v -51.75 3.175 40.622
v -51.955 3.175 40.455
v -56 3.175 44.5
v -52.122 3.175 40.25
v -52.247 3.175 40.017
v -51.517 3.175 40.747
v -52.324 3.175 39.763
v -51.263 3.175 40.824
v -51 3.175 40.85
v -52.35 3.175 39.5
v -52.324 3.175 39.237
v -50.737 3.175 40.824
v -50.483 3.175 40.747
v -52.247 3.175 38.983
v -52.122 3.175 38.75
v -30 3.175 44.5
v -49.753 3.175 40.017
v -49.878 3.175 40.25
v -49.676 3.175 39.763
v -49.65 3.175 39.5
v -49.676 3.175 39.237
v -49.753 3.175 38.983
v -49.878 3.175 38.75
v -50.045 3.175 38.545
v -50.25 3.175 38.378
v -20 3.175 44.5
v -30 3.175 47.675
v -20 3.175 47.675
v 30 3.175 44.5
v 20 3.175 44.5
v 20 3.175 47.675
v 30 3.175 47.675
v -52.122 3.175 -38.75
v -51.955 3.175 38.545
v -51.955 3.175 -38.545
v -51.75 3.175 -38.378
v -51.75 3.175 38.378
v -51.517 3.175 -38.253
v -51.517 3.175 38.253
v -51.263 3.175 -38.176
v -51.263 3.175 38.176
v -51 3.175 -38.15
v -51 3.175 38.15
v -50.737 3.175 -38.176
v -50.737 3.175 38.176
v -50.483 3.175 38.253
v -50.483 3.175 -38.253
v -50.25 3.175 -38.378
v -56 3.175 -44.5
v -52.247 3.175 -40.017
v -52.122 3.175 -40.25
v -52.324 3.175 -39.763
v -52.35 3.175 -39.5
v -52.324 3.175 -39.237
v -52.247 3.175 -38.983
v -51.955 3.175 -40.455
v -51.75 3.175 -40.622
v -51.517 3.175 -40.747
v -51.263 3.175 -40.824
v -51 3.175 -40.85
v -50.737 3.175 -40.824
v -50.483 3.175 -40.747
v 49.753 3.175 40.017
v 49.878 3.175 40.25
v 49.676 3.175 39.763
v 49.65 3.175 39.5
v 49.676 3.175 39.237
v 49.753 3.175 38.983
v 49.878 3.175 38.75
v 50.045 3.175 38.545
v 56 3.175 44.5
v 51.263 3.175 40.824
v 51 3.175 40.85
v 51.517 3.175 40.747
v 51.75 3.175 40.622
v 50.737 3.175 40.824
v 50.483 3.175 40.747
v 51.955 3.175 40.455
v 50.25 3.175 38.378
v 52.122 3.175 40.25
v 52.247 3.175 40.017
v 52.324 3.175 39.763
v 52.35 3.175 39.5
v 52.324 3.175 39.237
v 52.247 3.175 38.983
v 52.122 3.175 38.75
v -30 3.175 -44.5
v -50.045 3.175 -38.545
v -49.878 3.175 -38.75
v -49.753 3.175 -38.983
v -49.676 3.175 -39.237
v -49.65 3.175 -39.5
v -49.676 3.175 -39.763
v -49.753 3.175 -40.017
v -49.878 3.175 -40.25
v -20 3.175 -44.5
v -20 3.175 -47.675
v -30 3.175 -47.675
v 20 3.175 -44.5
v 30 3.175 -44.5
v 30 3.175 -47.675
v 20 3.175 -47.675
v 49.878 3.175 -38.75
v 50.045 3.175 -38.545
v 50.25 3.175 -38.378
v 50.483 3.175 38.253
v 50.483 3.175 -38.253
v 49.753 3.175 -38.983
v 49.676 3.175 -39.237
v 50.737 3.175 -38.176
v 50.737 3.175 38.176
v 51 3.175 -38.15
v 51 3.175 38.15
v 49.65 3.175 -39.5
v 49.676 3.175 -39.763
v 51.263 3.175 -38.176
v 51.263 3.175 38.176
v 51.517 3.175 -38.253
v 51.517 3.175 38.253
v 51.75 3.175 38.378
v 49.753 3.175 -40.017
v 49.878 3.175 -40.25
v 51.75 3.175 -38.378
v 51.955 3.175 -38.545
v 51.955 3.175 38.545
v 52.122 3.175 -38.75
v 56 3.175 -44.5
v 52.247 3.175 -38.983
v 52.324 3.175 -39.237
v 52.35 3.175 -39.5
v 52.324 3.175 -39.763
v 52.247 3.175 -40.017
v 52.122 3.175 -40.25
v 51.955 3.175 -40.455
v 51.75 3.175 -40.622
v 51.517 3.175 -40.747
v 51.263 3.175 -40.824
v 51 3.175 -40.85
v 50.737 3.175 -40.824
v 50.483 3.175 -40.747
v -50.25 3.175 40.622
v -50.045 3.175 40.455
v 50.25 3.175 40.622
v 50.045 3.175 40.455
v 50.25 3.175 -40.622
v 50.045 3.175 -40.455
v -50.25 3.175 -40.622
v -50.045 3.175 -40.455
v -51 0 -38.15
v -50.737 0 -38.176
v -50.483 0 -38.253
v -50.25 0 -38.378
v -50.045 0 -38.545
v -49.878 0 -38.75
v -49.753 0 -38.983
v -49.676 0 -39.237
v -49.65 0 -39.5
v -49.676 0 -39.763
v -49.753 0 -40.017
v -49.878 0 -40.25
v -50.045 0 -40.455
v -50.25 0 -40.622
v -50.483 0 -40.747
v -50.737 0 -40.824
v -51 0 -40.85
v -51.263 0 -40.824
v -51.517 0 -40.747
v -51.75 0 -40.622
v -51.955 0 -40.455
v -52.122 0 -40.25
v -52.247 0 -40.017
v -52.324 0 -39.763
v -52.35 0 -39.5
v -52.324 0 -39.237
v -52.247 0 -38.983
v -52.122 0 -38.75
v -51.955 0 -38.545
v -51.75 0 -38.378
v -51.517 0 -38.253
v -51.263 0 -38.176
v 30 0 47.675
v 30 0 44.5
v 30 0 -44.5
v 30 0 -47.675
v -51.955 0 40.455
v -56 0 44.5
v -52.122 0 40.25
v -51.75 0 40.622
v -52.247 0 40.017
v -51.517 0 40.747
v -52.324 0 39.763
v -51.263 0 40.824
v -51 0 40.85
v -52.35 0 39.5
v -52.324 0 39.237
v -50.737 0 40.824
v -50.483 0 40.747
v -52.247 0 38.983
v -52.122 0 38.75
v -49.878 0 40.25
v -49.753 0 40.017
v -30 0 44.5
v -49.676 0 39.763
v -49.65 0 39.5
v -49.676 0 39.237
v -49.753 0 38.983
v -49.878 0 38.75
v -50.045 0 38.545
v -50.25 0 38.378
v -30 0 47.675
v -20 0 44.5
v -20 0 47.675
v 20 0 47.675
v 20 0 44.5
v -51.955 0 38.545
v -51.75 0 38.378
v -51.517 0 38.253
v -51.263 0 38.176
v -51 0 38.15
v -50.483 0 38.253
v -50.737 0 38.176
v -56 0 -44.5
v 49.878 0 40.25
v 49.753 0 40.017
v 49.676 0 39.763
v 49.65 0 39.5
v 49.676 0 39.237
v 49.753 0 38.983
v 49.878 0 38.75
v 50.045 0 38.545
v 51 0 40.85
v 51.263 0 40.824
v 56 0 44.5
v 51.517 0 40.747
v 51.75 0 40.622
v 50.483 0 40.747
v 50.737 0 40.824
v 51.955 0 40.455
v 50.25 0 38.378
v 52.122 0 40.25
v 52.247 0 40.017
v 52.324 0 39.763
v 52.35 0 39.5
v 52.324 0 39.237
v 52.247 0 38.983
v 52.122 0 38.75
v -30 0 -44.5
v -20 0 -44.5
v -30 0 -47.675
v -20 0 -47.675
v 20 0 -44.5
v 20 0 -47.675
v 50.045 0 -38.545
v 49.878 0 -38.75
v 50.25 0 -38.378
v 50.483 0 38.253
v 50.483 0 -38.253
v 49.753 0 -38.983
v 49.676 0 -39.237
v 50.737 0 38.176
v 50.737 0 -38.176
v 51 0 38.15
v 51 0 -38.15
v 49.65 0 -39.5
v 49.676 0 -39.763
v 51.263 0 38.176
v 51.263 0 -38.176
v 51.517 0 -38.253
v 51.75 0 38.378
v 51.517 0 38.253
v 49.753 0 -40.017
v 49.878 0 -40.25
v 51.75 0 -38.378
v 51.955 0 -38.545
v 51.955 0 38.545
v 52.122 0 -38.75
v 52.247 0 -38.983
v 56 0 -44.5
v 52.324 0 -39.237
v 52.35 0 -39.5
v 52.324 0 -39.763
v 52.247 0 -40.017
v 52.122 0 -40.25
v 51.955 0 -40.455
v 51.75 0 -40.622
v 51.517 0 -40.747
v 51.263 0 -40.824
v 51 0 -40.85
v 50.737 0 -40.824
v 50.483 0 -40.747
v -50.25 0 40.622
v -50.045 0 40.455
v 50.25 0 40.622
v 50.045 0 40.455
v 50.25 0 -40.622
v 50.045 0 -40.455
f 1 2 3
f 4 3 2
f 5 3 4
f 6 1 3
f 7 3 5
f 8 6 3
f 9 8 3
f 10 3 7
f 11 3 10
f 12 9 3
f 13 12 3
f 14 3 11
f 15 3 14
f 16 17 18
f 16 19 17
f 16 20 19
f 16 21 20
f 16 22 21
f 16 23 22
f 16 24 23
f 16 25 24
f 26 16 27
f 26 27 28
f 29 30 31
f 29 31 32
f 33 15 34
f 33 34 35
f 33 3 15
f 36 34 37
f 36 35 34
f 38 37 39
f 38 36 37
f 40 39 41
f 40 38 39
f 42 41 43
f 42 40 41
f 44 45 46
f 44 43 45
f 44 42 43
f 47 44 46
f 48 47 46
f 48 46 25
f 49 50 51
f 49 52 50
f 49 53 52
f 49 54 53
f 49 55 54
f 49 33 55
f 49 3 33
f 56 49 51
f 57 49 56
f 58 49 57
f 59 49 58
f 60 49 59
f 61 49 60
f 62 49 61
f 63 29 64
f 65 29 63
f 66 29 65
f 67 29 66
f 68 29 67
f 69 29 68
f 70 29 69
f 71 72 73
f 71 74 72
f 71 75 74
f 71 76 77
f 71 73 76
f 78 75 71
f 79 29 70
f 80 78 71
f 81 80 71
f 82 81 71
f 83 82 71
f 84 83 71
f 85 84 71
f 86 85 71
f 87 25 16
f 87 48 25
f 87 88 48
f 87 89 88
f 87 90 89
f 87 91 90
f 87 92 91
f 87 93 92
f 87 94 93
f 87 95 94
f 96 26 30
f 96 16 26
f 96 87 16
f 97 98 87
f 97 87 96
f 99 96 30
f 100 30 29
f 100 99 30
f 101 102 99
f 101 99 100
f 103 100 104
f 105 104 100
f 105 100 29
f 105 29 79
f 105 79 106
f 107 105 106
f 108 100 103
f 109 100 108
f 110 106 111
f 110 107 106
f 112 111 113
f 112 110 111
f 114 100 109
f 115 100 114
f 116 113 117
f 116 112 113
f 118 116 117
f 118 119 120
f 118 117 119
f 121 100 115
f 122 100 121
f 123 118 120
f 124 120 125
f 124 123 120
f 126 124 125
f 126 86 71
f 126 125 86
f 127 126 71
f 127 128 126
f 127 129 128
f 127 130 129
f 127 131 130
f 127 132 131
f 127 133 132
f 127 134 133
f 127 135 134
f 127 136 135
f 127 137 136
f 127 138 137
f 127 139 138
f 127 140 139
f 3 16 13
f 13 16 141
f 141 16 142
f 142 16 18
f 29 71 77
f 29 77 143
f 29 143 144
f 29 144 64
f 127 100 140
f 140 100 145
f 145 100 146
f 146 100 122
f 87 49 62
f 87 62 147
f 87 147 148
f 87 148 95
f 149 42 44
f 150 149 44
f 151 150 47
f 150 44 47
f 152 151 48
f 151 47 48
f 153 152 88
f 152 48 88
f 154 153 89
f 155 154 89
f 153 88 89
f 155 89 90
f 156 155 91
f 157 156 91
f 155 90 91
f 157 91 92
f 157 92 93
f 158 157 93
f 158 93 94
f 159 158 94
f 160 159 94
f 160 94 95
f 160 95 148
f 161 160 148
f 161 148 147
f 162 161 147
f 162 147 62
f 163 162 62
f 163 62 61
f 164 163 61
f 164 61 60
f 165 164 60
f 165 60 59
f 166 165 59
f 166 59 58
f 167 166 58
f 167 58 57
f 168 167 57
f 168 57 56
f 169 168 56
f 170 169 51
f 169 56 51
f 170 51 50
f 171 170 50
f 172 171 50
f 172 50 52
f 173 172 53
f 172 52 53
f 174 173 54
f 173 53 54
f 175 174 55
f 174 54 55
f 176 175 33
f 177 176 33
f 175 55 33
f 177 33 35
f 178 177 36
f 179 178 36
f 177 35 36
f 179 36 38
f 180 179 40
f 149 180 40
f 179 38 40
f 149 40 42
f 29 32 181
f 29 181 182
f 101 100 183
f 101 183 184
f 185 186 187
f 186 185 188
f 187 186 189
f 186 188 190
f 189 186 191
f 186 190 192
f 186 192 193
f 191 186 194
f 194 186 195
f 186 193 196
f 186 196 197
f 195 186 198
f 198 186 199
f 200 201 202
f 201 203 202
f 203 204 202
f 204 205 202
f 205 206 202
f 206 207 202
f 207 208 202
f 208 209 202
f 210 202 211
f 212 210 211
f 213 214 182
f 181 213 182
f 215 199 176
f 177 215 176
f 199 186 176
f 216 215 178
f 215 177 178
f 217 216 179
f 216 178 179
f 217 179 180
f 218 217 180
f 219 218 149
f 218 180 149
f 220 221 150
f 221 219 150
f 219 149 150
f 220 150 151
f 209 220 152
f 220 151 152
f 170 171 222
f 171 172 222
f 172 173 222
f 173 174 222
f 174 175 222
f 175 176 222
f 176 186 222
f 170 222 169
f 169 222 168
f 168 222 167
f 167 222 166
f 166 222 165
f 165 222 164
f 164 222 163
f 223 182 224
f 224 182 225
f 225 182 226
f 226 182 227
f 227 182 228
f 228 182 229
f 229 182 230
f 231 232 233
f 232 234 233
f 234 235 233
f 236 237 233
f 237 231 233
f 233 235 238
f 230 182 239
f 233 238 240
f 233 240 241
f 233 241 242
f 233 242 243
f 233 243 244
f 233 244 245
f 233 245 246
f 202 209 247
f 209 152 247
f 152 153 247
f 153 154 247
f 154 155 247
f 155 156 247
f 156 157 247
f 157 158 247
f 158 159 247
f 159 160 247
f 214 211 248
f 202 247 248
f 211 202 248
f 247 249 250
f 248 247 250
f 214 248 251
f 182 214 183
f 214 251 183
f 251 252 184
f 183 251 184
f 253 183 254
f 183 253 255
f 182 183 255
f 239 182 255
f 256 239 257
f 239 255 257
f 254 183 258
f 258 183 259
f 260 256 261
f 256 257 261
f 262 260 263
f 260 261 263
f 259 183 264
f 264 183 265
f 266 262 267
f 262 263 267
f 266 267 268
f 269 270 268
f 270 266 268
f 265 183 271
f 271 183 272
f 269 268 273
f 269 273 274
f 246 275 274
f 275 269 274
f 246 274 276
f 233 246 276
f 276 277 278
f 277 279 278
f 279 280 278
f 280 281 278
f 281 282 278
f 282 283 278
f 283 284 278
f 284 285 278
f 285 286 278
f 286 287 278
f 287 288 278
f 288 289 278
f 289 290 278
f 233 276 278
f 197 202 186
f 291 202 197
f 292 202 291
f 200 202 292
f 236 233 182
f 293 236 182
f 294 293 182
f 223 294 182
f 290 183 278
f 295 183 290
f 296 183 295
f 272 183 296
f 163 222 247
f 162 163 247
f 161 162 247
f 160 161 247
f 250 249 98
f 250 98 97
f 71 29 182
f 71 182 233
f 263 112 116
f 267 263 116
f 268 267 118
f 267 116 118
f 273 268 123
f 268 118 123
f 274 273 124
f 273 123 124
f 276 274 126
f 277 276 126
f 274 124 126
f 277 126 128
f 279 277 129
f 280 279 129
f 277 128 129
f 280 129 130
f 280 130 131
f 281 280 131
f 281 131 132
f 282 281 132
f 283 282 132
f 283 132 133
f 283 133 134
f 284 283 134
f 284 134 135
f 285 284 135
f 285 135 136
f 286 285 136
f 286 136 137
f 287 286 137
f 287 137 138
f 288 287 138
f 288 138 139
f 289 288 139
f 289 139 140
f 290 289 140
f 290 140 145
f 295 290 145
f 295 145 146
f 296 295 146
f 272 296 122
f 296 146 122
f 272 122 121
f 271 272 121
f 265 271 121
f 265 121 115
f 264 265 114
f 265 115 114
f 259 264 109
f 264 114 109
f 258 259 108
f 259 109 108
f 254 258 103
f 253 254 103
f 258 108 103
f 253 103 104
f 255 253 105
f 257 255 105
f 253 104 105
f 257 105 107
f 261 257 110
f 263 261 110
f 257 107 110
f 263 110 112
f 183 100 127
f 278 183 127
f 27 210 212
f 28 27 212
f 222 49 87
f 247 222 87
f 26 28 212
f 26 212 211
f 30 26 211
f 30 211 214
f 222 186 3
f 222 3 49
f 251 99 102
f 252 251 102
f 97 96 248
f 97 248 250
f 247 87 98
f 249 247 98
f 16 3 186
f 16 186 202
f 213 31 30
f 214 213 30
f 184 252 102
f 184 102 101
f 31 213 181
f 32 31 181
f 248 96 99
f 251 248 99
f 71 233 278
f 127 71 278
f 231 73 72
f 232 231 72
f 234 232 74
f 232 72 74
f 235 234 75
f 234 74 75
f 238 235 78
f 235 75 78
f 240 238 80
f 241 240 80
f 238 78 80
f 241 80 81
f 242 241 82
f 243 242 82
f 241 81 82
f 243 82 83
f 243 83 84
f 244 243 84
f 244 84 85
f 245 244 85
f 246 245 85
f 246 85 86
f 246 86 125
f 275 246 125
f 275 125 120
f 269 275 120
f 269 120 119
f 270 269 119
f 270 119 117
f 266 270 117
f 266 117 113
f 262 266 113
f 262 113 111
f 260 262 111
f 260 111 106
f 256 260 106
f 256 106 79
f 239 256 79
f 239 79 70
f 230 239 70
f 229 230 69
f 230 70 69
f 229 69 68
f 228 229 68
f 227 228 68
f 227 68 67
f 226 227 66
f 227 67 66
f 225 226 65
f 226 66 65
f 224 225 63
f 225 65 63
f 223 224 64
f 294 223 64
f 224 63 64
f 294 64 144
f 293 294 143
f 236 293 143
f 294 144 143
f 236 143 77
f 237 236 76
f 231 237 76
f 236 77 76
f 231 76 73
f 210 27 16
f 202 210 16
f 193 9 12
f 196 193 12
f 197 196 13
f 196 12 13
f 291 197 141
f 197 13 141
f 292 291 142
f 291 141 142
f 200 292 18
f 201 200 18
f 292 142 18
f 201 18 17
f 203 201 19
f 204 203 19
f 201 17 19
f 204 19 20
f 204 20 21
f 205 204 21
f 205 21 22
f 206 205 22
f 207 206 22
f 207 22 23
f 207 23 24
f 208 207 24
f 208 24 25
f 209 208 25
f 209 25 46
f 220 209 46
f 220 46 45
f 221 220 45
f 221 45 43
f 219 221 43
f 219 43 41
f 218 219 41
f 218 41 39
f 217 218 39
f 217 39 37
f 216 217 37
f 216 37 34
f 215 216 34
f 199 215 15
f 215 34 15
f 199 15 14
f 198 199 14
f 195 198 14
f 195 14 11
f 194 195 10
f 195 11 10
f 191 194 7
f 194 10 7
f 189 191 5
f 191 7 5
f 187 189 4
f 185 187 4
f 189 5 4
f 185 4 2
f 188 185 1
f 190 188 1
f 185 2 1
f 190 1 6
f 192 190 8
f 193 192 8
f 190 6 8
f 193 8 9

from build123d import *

# Parameters (mm, degrees)
SKETCH1_W           = 112
SKETCH1_H           = 95.35
BOSS_EXTRUDE1_DEPTH = 3.175
SKETCH2_W           = 40
SKETCH2_H           = 3.175
SKETCH2_W_2         = 26
CUT_EXTRUDE1_DEPTH  = 74.613763998
SKETCH3_R           = 1.35
CUT_EXTRUDE2_DEPTH  = 74.613763998


with BuildPart() as part:
    # Sketch1 → Boss-Extrude1 (new body)
    with BuildSketch(Plane(origin=(0, 0, 0), x_dir=(1, 0, 0), z_dir=(0, 1, 0))):
        Rectangle(SKETCH1_W, SKETCH1_H)
    extrude(amount=BOSS_EXTRUDE1_DEPTH)

    # Sketch2 → Cut-Extrude1 (cut, through all)
    with BuildSketch(Plane(origin=(0, 3.175, 0), x_dir=(1, 0, 0), z_dir=(0, 1, 0))):
        with Locations((0, 46.0875)):
            Rectangle(SKETCH2_W, SKETCH2_H)
        with Locations((43, 46.0875)):
            Rectangle(SKETCH2_W_2, SKETCH2_H)
        with Locations((-43, 46.0875)):
            Rectangle(SKETCH2_W_2, SKETCH2_H)
        with Locations((0, -46.0875)):
            Rectangle(SKETCH2_W, SKETCH2_H)
        with Locations((-43, -46.0875)):
            Rectangle(SKETCH2_W_2, SKETCH2_H)
        with Locations((43, -46.0875)):
            Rectangle(SKETCH2_W_2, SKETCH2_H)
    extrude(amount=-CUT_EXTRUDE1_DEPTH, mode=Mode.SUBTRACT)

    # Sketch3 → Cut-Extrude2 (cut, through all)
    with BuildSketch(Plane(origin=(0, 3.175, 0), x_dir=(1, 0, 0), z_dir=(0, 1, 0))):
        with Locations(Location((-51, 39.5, 0), (0, 0, 270))):
            Circle(SKETCH3_R)
        with Locations(Location((51, 39.5, 0), (0, 0, 270))):
            Circle(SKETCH3_R)
        with Locations(Location((-51, -39.5, 0), (0, 0, 270))):
            Circle(SKETCH3_R)
        with Locations(Location((51, -39.5, 0), (0, 0, 270))):
            Circle(SKETCH3_R)
    extrude(amount=-CUT_EXTRUDE2_DEPTH, mode=Mode.SUBTRACT)


solid = part.part
